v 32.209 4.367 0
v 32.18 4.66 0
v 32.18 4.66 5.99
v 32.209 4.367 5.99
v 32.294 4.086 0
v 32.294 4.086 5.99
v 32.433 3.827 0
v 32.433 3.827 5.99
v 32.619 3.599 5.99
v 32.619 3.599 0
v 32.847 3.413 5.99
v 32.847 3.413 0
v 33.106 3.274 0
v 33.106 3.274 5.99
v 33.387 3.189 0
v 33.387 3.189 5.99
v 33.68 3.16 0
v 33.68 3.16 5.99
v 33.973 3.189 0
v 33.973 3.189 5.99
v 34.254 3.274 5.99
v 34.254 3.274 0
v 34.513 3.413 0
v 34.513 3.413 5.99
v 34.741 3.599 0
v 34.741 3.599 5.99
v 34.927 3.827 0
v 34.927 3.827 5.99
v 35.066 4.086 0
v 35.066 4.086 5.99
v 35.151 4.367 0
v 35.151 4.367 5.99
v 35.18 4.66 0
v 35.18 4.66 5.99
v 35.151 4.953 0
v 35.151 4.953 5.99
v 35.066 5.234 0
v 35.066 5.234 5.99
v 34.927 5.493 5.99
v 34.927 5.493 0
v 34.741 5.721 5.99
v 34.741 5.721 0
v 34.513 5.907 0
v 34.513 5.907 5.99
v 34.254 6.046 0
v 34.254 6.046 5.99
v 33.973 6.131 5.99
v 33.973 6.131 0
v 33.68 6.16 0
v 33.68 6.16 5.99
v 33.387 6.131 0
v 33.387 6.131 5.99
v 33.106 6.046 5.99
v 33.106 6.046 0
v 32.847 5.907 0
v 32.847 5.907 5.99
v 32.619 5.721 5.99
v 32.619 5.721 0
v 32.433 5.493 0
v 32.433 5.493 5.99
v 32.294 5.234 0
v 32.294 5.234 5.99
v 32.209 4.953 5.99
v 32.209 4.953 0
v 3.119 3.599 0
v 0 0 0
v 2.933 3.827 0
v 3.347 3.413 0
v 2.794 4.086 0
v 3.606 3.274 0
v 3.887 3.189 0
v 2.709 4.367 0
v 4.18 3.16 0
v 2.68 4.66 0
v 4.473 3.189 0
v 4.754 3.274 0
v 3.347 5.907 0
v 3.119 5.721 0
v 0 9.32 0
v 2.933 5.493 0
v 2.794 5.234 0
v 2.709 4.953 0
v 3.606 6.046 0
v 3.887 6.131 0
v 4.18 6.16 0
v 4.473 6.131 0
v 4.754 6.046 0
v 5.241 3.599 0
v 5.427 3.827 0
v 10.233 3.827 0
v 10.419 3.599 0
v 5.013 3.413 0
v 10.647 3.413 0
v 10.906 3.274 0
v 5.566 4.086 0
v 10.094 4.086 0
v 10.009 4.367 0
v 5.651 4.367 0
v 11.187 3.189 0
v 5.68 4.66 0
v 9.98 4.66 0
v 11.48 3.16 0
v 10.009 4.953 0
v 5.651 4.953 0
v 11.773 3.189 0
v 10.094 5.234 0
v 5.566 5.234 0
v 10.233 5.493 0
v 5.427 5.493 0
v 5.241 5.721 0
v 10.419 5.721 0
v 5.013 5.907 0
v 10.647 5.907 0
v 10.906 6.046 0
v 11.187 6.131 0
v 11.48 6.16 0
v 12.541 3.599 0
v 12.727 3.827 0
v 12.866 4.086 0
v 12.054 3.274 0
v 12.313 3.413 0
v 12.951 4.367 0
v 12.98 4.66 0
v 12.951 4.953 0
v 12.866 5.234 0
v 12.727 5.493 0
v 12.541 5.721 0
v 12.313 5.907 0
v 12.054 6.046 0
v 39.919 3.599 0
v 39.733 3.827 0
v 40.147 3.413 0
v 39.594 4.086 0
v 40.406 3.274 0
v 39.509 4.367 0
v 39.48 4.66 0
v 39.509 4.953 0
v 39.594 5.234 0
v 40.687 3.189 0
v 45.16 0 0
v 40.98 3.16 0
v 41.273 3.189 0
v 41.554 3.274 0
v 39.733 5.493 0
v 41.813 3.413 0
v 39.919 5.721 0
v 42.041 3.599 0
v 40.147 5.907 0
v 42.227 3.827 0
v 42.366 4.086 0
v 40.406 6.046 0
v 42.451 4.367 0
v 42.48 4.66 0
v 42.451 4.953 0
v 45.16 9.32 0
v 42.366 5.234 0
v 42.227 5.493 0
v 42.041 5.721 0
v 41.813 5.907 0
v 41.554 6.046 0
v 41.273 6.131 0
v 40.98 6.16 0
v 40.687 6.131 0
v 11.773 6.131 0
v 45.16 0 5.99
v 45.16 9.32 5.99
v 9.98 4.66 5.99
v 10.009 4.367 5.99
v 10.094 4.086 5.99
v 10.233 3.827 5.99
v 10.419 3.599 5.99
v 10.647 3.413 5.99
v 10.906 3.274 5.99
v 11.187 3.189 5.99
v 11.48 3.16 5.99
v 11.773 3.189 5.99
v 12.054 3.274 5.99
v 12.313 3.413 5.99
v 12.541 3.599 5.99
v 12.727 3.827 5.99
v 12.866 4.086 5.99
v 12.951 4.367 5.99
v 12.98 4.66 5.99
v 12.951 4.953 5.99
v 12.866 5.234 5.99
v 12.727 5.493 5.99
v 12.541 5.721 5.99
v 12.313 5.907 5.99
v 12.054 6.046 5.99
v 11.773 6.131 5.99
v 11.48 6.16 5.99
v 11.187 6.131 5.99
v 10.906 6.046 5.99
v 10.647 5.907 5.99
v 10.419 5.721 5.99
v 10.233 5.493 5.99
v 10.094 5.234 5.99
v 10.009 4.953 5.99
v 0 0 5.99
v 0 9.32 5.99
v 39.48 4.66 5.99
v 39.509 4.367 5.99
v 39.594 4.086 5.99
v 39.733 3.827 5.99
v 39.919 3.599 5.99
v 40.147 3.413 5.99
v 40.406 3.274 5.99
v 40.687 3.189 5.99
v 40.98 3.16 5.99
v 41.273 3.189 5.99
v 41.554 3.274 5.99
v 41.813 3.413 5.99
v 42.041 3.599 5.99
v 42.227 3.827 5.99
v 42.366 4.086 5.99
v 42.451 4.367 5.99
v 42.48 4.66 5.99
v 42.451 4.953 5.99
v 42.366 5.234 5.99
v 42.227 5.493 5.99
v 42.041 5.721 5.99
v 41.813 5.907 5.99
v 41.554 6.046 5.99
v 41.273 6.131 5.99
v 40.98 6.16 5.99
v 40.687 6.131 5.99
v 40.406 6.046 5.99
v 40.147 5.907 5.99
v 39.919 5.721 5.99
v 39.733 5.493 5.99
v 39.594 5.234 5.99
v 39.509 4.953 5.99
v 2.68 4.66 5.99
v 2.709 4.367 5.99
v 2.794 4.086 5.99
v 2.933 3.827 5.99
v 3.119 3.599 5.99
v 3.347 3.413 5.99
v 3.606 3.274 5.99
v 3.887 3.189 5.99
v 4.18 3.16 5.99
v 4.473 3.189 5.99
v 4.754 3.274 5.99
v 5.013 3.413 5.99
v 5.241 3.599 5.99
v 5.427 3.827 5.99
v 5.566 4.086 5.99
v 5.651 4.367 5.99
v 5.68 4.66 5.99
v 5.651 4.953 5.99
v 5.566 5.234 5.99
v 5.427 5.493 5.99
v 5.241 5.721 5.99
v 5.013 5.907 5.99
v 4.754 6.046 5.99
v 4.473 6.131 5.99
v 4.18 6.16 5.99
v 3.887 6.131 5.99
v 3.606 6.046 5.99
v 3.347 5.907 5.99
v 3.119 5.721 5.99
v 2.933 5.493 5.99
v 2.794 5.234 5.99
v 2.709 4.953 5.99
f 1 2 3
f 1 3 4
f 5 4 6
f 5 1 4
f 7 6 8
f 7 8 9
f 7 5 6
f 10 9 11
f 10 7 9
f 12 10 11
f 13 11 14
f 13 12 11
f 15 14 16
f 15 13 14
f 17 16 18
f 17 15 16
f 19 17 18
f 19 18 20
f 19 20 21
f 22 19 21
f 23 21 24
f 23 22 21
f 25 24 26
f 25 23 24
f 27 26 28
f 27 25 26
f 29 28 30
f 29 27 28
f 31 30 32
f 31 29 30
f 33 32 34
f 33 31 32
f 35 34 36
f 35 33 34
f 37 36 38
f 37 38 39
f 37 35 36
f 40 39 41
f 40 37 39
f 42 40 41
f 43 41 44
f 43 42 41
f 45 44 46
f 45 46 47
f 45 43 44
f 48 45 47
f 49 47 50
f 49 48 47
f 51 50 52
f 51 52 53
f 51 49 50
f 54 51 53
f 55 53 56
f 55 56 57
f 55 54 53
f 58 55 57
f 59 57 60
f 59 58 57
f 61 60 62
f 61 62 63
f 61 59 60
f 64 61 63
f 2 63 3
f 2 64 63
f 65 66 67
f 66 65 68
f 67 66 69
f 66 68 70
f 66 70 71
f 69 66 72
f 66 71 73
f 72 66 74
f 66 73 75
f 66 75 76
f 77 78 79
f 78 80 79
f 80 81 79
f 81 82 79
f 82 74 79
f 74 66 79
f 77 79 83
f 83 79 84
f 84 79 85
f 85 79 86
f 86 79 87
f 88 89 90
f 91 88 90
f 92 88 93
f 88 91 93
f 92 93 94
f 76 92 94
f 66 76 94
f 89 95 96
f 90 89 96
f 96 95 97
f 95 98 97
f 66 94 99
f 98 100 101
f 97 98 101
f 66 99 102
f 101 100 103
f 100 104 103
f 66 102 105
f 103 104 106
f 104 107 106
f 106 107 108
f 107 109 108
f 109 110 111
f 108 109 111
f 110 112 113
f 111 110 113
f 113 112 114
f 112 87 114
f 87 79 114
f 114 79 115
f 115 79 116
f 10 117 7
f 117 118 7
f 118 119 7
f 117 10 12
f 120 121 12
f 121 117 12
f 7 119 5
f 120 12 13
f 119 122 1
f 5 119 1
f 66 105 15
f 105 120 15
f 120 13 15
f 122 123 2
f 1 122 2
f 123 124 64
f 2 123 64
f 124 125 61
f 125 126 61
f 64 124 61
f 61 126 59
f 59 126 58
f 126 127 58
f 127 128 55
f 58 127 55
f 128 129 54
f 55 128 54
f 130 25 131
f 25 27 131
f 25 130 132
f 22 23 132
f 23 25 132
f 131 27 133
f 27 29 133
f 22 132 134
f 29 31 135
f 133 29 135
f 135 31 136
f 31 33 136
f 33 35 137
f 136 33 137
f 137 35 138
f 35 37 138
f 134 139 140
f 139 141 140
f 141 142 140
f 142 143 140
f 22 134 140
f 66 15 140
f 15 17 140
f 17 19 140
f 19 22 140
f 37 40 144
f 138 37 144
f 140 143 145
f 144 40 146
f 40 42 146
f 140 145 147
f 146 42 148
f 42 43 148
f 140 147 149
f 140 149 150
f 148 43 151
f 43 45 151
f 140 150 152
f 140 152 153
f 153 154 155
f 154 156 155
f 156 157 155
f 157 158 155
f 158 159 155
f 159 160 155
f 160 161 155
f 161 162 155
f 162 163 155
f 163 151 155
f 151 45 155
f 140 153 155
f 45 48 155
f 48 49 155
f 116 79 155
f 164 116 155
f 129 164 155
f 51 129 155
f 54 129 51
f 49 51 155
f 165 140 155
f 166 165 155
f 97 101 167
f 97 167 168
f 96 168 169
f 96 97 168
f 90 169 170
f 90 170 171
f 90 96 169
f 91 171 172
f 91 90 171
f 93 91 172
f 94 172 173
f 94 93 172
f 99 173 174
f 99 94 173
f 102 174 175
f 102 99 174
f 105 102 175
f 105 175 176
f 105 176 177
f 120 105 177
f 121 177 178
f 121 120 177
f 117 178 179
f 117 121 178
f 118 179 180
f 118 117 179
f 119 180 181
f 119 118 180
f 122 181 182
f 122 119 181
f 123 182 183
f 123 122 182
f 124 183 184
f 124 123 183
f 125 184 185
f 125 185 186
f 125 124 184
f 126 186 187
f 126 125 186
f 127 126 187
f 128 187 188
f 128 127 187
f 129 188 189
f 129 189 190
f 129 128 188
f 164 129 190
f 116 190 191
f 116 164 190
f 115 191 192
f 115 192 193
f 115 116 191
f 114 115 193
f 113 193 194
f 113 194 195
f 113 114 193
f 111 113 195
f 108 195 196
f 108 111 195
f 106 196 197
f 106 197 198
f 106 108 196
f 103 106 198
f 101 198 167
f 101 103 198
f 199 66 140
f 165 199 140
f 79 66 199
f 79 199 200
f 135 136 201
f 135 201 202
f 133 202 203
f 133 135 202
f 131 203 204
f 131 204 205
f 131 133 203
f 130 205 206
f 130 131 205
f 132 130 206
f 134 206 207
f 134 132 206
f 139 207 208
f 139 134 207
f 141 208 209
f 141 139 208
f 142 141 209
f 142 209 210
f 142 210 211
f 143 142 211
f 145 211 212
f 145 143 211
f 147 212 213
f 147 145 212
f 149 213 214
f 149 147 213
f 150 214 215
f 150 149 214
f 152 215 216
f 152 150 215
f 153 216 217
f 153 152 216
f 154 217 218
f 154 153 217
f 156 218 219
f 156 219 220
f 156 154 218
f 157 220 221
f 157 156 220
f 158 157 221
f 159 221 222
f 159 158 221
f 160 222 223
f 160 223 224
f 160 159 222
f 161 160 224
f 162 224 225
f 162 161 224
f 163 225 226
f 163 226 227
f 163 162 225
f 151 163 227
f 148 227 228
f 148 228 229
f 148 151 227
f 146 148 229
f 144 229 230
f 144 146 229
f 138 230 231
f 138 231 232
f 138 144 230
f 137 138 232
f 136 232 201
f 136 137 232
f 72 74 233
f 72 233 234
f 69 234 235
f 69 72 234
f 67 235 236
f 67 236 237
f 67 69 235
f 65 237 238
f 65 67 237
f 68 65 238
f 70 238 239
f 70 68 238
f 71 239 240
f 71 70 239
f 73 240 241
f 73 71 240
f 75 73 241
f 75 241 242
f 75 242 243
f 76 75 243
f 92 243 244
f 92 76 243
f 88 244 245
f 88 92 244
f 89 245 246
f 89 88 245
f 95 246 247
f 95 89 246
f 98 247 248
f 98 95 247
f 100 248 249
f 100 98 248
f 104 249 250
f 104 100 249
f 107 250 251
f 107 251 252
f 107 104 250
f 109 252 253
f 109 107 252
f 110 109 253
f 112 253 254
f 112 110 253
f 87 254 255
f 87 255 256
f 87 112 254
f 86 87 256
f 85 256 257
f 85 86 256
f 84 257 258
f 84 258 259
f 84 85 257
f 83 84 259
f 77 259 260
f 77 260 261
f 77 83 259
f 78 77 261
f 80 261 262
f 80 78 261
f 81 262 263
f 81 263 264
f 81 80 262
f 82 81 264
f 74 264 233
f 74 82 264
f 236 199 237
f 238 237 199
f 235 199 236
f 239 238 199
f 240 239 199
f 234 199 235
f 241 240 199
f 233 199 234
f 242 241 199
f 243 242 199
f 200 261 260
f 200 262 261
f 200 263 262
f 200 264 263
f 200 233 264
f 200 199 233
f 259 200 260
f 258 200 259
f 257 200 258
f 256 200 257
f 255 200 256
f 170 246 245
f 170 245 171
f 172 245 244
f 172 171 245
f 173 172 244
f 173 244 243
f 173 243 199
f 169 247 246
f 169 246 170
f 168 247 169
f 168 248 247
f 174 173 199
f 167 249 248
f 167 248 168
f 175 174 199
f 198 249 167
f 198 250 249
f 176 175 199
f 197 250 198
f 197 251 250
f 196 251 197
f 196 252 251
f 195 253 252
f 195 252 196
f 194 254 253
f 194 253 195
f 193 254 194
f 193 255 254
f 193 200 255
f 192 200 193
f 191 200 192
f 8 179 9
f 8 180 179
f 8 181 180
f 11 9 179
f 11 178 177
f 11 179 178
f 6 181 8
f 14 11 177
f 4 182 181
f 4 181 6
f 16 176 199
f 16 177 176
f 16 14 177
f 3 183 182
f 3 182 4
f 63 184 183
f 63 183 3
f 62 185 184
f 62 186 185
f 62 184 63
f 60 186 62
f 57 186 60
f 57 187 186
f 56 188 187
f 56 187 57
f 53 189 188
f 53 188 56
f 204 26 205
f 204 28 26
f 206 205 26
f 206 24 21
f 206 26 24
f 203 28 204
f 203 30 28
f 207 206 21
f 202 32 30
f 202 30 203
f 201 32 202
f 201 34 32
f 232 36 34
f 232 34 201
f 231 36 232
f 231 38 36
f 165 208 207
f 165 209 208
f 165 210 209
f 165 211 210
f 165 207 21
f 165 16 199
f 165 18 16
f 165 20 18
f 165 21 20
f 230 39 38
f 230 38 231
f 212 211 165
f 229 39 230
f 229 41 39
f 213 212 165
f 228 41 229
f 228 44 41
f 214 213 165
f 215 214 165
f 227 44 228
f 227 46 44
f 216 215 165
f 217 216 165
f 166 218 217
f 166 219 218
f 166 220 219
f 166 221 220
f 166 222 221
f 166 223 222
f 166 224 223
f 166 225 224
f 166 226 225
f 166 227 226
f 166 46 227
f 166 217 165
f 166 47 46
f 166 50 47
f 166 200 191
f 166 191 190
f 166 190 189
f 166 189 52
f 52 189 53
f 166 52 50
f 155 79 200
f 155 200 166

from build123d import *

# Parameters (mm, degrees)
CROQUIS1_W              = 45.16
CROQUIS1_H              = 9.32
CROQUIS1_R              = 1.5
SALIENTE_EXTRUIR1_DEPTH = 5.99


with BuildPart() as part:
    # Croquis1 → Saliente-Extruir1 (new body)
    with BuildSketch(Plane.XY):
        with Locations((22.58, 4.66)):
            Rectangle(CROQUIS1_W, CROQUIS1_H)
        with Locations(Location((4.18, 4.66, 0), (0, 0, 180))):
            Circle(CROQUIS1_R, mode=Mode.SUBTRACT)
        with Locations(Location((11.48, 4.66, 0), (0, 0, 180))):
            Circle(CROQUIS1_R, mode=Mode.SUBTRACT)
        with Locations(Location((40.98, 4.66, 0), (0, 0, 180))):
            Circle(CROQUIS1_R, mode=Mode.SUBTRACT)
        with Locations(Location((33.68, 4.66, 0), (0, 0, 180))):
            Circle(CROQUIS1_R, mode=Mode.SUBTRACT)
    extrude(amount=SALIENTE_EXTRUIR1_DEPTH)


solid = part.part
